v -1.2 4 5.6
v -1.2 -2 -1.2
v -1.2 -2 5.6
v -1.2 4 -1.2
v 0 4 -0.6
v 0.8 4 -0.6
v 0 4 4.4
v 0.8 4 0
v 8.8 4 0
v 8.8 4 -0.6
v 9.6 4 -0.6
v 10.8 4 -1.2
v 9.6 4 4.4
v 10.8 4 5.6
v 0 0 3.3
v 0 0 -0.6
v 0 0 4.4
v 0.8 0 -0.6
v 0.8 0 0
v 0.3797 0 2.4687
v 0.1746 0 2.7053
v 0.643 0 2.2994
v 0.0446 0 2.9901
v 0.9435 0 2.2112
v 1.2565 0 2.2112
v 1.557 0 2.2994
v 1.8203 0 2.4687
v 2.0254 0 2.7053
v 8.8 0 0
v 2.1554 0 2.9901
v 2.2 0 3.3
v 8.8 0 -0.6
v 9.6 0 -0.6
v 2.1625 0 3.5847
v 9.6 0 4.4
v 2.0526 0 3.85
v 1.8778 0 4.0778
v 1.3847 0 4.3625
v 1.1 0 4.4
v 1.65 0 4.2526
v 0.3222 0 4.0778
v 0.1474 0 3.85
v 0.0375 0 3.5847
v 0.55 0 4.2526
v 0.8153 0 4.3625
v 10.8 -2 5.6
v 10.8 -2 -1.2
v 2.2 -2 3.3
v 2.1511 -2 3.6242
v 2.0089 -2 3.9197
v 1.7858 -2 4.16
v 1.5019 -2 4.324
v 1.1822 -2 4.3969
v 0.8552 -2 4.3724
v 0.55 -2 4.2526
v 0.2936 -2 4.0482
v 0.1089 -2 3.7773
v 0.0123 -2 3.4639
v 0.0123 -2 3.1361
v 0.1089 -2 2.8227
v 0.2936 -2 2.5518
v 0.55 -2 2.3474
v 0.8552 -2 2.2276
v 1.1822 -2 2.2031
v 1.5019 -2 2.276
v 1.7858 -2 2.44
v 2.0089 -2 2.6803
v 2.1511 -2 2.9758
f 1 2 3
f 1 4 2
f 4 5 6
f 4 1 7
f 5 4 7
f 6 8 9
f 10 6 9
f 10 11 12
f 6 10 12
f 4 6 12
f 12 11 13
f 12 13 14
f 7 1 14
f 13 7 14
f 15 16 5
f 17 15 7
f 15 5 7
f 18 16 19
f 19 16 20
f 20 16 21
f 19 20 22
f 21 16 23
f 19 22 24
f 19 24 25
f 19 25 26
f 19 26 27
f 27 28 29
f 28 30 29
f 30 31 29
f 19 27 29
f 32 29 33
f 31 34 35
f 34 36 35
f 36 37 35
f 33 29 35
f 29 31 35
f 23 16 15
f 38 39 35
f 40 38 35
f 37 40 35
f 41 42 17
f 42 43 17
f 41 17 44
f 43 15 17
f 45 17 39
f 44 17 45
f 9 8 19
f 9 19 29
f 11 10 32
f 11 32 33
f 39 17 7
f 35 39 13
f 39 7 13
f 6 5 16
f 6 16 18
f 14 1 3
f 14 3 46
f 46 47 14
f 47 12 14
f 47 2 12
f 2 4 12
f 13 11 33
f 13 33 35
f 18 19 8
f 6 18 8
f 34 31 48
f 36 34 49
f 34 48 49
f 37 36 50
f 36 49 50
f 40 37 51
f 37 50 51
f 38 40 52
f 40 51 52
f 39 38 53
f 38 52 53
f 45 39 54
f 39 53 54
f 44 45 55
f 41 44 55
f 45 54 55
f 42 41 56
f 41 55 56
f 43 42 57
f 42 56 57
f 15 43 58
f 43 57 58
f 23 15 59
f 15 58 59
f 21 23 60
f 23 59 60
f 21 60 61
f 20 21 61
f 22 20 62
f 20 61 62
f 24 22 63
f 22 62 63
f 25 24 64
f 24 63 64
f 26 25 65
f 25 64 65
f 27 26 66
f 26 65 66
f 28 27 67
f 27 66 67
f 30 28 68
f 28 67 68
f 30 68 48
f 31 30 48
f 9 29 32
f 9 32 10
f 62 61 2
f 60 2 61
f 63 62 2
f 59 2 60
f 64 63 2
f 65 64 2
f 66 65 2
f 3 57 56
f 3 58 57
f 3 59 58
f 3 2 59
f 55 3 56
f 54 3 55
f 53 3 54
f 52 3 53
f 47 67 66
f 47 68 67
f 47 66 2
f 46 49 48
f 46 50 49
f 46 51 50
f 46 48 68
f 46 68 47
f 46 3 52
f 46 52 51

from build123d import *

# Parameters (mm, degrees)
F0_W          = 12
F0_H          = 6.8
F0_W_2        = 9.6
F0_H_2        = 4.4
F1_DEPTH      = 4
F1_DEPTH_BACK = 2
F3_W          = 0.8
F3_H          = 4
F2_W          = 0.8
F2_H          = 4
F4_DEPTH      = 0.6
F5_W          = 9.6
F5_H          = 4.4
F6_DEPTH      = 2
F7_R          = 1.1
F8_DEPTH      = 12.5


with BuildPart() as f1:
    # F0 (on Front) → F1 (new body, two sides)
    with BuildSketch(Plane.XZ) as f1_sk:
        with Locations((4.8, 2.2)):
            Rectangle(F0_W, F0_H)
        with Locations((4.8, 2.2)):
            Rectangle(F0_W_2, F0_H_2, mode=Mode.SUBTRACT)
    extrude(amount=-F1_DEPTH)
    extrude(f1_sk.sketch, amount=F1_DEPTH_BACK)

    # F3 (on face) + F2 (on face) → F4 (cut)
    with BuildSketch(Plane.XY):
        with Locations((0.4, 2)):
            Rectangle(F3_W, F3_H)
    with BuildSketch(Plane.XY):
        with Locations((9.2, 2)):
            Rectangle(F2_W, F2_H)
    extrude(amount=-F4_DEPTH, mode=Mode.SUBTRACT)

    # F5 (on Front) → F6 (join)
    with BuildSketch(Plane.XZ):
        with Locations((4.8, 2.2)):
            Rectangle(F5_W, F5_H)
    extrude(amount=F6_DEPTH)

    # F7 (on Front) → F8 (cut, symmetric)
    with BuildSketch(Plane.XZ):
        with Locations((1.1, 3.3)):
            Circle(F7_R)
    extrude(amount=F8_DEPTH, both=True, mode=Mode.SUBTRACT)


solid = f1.part
